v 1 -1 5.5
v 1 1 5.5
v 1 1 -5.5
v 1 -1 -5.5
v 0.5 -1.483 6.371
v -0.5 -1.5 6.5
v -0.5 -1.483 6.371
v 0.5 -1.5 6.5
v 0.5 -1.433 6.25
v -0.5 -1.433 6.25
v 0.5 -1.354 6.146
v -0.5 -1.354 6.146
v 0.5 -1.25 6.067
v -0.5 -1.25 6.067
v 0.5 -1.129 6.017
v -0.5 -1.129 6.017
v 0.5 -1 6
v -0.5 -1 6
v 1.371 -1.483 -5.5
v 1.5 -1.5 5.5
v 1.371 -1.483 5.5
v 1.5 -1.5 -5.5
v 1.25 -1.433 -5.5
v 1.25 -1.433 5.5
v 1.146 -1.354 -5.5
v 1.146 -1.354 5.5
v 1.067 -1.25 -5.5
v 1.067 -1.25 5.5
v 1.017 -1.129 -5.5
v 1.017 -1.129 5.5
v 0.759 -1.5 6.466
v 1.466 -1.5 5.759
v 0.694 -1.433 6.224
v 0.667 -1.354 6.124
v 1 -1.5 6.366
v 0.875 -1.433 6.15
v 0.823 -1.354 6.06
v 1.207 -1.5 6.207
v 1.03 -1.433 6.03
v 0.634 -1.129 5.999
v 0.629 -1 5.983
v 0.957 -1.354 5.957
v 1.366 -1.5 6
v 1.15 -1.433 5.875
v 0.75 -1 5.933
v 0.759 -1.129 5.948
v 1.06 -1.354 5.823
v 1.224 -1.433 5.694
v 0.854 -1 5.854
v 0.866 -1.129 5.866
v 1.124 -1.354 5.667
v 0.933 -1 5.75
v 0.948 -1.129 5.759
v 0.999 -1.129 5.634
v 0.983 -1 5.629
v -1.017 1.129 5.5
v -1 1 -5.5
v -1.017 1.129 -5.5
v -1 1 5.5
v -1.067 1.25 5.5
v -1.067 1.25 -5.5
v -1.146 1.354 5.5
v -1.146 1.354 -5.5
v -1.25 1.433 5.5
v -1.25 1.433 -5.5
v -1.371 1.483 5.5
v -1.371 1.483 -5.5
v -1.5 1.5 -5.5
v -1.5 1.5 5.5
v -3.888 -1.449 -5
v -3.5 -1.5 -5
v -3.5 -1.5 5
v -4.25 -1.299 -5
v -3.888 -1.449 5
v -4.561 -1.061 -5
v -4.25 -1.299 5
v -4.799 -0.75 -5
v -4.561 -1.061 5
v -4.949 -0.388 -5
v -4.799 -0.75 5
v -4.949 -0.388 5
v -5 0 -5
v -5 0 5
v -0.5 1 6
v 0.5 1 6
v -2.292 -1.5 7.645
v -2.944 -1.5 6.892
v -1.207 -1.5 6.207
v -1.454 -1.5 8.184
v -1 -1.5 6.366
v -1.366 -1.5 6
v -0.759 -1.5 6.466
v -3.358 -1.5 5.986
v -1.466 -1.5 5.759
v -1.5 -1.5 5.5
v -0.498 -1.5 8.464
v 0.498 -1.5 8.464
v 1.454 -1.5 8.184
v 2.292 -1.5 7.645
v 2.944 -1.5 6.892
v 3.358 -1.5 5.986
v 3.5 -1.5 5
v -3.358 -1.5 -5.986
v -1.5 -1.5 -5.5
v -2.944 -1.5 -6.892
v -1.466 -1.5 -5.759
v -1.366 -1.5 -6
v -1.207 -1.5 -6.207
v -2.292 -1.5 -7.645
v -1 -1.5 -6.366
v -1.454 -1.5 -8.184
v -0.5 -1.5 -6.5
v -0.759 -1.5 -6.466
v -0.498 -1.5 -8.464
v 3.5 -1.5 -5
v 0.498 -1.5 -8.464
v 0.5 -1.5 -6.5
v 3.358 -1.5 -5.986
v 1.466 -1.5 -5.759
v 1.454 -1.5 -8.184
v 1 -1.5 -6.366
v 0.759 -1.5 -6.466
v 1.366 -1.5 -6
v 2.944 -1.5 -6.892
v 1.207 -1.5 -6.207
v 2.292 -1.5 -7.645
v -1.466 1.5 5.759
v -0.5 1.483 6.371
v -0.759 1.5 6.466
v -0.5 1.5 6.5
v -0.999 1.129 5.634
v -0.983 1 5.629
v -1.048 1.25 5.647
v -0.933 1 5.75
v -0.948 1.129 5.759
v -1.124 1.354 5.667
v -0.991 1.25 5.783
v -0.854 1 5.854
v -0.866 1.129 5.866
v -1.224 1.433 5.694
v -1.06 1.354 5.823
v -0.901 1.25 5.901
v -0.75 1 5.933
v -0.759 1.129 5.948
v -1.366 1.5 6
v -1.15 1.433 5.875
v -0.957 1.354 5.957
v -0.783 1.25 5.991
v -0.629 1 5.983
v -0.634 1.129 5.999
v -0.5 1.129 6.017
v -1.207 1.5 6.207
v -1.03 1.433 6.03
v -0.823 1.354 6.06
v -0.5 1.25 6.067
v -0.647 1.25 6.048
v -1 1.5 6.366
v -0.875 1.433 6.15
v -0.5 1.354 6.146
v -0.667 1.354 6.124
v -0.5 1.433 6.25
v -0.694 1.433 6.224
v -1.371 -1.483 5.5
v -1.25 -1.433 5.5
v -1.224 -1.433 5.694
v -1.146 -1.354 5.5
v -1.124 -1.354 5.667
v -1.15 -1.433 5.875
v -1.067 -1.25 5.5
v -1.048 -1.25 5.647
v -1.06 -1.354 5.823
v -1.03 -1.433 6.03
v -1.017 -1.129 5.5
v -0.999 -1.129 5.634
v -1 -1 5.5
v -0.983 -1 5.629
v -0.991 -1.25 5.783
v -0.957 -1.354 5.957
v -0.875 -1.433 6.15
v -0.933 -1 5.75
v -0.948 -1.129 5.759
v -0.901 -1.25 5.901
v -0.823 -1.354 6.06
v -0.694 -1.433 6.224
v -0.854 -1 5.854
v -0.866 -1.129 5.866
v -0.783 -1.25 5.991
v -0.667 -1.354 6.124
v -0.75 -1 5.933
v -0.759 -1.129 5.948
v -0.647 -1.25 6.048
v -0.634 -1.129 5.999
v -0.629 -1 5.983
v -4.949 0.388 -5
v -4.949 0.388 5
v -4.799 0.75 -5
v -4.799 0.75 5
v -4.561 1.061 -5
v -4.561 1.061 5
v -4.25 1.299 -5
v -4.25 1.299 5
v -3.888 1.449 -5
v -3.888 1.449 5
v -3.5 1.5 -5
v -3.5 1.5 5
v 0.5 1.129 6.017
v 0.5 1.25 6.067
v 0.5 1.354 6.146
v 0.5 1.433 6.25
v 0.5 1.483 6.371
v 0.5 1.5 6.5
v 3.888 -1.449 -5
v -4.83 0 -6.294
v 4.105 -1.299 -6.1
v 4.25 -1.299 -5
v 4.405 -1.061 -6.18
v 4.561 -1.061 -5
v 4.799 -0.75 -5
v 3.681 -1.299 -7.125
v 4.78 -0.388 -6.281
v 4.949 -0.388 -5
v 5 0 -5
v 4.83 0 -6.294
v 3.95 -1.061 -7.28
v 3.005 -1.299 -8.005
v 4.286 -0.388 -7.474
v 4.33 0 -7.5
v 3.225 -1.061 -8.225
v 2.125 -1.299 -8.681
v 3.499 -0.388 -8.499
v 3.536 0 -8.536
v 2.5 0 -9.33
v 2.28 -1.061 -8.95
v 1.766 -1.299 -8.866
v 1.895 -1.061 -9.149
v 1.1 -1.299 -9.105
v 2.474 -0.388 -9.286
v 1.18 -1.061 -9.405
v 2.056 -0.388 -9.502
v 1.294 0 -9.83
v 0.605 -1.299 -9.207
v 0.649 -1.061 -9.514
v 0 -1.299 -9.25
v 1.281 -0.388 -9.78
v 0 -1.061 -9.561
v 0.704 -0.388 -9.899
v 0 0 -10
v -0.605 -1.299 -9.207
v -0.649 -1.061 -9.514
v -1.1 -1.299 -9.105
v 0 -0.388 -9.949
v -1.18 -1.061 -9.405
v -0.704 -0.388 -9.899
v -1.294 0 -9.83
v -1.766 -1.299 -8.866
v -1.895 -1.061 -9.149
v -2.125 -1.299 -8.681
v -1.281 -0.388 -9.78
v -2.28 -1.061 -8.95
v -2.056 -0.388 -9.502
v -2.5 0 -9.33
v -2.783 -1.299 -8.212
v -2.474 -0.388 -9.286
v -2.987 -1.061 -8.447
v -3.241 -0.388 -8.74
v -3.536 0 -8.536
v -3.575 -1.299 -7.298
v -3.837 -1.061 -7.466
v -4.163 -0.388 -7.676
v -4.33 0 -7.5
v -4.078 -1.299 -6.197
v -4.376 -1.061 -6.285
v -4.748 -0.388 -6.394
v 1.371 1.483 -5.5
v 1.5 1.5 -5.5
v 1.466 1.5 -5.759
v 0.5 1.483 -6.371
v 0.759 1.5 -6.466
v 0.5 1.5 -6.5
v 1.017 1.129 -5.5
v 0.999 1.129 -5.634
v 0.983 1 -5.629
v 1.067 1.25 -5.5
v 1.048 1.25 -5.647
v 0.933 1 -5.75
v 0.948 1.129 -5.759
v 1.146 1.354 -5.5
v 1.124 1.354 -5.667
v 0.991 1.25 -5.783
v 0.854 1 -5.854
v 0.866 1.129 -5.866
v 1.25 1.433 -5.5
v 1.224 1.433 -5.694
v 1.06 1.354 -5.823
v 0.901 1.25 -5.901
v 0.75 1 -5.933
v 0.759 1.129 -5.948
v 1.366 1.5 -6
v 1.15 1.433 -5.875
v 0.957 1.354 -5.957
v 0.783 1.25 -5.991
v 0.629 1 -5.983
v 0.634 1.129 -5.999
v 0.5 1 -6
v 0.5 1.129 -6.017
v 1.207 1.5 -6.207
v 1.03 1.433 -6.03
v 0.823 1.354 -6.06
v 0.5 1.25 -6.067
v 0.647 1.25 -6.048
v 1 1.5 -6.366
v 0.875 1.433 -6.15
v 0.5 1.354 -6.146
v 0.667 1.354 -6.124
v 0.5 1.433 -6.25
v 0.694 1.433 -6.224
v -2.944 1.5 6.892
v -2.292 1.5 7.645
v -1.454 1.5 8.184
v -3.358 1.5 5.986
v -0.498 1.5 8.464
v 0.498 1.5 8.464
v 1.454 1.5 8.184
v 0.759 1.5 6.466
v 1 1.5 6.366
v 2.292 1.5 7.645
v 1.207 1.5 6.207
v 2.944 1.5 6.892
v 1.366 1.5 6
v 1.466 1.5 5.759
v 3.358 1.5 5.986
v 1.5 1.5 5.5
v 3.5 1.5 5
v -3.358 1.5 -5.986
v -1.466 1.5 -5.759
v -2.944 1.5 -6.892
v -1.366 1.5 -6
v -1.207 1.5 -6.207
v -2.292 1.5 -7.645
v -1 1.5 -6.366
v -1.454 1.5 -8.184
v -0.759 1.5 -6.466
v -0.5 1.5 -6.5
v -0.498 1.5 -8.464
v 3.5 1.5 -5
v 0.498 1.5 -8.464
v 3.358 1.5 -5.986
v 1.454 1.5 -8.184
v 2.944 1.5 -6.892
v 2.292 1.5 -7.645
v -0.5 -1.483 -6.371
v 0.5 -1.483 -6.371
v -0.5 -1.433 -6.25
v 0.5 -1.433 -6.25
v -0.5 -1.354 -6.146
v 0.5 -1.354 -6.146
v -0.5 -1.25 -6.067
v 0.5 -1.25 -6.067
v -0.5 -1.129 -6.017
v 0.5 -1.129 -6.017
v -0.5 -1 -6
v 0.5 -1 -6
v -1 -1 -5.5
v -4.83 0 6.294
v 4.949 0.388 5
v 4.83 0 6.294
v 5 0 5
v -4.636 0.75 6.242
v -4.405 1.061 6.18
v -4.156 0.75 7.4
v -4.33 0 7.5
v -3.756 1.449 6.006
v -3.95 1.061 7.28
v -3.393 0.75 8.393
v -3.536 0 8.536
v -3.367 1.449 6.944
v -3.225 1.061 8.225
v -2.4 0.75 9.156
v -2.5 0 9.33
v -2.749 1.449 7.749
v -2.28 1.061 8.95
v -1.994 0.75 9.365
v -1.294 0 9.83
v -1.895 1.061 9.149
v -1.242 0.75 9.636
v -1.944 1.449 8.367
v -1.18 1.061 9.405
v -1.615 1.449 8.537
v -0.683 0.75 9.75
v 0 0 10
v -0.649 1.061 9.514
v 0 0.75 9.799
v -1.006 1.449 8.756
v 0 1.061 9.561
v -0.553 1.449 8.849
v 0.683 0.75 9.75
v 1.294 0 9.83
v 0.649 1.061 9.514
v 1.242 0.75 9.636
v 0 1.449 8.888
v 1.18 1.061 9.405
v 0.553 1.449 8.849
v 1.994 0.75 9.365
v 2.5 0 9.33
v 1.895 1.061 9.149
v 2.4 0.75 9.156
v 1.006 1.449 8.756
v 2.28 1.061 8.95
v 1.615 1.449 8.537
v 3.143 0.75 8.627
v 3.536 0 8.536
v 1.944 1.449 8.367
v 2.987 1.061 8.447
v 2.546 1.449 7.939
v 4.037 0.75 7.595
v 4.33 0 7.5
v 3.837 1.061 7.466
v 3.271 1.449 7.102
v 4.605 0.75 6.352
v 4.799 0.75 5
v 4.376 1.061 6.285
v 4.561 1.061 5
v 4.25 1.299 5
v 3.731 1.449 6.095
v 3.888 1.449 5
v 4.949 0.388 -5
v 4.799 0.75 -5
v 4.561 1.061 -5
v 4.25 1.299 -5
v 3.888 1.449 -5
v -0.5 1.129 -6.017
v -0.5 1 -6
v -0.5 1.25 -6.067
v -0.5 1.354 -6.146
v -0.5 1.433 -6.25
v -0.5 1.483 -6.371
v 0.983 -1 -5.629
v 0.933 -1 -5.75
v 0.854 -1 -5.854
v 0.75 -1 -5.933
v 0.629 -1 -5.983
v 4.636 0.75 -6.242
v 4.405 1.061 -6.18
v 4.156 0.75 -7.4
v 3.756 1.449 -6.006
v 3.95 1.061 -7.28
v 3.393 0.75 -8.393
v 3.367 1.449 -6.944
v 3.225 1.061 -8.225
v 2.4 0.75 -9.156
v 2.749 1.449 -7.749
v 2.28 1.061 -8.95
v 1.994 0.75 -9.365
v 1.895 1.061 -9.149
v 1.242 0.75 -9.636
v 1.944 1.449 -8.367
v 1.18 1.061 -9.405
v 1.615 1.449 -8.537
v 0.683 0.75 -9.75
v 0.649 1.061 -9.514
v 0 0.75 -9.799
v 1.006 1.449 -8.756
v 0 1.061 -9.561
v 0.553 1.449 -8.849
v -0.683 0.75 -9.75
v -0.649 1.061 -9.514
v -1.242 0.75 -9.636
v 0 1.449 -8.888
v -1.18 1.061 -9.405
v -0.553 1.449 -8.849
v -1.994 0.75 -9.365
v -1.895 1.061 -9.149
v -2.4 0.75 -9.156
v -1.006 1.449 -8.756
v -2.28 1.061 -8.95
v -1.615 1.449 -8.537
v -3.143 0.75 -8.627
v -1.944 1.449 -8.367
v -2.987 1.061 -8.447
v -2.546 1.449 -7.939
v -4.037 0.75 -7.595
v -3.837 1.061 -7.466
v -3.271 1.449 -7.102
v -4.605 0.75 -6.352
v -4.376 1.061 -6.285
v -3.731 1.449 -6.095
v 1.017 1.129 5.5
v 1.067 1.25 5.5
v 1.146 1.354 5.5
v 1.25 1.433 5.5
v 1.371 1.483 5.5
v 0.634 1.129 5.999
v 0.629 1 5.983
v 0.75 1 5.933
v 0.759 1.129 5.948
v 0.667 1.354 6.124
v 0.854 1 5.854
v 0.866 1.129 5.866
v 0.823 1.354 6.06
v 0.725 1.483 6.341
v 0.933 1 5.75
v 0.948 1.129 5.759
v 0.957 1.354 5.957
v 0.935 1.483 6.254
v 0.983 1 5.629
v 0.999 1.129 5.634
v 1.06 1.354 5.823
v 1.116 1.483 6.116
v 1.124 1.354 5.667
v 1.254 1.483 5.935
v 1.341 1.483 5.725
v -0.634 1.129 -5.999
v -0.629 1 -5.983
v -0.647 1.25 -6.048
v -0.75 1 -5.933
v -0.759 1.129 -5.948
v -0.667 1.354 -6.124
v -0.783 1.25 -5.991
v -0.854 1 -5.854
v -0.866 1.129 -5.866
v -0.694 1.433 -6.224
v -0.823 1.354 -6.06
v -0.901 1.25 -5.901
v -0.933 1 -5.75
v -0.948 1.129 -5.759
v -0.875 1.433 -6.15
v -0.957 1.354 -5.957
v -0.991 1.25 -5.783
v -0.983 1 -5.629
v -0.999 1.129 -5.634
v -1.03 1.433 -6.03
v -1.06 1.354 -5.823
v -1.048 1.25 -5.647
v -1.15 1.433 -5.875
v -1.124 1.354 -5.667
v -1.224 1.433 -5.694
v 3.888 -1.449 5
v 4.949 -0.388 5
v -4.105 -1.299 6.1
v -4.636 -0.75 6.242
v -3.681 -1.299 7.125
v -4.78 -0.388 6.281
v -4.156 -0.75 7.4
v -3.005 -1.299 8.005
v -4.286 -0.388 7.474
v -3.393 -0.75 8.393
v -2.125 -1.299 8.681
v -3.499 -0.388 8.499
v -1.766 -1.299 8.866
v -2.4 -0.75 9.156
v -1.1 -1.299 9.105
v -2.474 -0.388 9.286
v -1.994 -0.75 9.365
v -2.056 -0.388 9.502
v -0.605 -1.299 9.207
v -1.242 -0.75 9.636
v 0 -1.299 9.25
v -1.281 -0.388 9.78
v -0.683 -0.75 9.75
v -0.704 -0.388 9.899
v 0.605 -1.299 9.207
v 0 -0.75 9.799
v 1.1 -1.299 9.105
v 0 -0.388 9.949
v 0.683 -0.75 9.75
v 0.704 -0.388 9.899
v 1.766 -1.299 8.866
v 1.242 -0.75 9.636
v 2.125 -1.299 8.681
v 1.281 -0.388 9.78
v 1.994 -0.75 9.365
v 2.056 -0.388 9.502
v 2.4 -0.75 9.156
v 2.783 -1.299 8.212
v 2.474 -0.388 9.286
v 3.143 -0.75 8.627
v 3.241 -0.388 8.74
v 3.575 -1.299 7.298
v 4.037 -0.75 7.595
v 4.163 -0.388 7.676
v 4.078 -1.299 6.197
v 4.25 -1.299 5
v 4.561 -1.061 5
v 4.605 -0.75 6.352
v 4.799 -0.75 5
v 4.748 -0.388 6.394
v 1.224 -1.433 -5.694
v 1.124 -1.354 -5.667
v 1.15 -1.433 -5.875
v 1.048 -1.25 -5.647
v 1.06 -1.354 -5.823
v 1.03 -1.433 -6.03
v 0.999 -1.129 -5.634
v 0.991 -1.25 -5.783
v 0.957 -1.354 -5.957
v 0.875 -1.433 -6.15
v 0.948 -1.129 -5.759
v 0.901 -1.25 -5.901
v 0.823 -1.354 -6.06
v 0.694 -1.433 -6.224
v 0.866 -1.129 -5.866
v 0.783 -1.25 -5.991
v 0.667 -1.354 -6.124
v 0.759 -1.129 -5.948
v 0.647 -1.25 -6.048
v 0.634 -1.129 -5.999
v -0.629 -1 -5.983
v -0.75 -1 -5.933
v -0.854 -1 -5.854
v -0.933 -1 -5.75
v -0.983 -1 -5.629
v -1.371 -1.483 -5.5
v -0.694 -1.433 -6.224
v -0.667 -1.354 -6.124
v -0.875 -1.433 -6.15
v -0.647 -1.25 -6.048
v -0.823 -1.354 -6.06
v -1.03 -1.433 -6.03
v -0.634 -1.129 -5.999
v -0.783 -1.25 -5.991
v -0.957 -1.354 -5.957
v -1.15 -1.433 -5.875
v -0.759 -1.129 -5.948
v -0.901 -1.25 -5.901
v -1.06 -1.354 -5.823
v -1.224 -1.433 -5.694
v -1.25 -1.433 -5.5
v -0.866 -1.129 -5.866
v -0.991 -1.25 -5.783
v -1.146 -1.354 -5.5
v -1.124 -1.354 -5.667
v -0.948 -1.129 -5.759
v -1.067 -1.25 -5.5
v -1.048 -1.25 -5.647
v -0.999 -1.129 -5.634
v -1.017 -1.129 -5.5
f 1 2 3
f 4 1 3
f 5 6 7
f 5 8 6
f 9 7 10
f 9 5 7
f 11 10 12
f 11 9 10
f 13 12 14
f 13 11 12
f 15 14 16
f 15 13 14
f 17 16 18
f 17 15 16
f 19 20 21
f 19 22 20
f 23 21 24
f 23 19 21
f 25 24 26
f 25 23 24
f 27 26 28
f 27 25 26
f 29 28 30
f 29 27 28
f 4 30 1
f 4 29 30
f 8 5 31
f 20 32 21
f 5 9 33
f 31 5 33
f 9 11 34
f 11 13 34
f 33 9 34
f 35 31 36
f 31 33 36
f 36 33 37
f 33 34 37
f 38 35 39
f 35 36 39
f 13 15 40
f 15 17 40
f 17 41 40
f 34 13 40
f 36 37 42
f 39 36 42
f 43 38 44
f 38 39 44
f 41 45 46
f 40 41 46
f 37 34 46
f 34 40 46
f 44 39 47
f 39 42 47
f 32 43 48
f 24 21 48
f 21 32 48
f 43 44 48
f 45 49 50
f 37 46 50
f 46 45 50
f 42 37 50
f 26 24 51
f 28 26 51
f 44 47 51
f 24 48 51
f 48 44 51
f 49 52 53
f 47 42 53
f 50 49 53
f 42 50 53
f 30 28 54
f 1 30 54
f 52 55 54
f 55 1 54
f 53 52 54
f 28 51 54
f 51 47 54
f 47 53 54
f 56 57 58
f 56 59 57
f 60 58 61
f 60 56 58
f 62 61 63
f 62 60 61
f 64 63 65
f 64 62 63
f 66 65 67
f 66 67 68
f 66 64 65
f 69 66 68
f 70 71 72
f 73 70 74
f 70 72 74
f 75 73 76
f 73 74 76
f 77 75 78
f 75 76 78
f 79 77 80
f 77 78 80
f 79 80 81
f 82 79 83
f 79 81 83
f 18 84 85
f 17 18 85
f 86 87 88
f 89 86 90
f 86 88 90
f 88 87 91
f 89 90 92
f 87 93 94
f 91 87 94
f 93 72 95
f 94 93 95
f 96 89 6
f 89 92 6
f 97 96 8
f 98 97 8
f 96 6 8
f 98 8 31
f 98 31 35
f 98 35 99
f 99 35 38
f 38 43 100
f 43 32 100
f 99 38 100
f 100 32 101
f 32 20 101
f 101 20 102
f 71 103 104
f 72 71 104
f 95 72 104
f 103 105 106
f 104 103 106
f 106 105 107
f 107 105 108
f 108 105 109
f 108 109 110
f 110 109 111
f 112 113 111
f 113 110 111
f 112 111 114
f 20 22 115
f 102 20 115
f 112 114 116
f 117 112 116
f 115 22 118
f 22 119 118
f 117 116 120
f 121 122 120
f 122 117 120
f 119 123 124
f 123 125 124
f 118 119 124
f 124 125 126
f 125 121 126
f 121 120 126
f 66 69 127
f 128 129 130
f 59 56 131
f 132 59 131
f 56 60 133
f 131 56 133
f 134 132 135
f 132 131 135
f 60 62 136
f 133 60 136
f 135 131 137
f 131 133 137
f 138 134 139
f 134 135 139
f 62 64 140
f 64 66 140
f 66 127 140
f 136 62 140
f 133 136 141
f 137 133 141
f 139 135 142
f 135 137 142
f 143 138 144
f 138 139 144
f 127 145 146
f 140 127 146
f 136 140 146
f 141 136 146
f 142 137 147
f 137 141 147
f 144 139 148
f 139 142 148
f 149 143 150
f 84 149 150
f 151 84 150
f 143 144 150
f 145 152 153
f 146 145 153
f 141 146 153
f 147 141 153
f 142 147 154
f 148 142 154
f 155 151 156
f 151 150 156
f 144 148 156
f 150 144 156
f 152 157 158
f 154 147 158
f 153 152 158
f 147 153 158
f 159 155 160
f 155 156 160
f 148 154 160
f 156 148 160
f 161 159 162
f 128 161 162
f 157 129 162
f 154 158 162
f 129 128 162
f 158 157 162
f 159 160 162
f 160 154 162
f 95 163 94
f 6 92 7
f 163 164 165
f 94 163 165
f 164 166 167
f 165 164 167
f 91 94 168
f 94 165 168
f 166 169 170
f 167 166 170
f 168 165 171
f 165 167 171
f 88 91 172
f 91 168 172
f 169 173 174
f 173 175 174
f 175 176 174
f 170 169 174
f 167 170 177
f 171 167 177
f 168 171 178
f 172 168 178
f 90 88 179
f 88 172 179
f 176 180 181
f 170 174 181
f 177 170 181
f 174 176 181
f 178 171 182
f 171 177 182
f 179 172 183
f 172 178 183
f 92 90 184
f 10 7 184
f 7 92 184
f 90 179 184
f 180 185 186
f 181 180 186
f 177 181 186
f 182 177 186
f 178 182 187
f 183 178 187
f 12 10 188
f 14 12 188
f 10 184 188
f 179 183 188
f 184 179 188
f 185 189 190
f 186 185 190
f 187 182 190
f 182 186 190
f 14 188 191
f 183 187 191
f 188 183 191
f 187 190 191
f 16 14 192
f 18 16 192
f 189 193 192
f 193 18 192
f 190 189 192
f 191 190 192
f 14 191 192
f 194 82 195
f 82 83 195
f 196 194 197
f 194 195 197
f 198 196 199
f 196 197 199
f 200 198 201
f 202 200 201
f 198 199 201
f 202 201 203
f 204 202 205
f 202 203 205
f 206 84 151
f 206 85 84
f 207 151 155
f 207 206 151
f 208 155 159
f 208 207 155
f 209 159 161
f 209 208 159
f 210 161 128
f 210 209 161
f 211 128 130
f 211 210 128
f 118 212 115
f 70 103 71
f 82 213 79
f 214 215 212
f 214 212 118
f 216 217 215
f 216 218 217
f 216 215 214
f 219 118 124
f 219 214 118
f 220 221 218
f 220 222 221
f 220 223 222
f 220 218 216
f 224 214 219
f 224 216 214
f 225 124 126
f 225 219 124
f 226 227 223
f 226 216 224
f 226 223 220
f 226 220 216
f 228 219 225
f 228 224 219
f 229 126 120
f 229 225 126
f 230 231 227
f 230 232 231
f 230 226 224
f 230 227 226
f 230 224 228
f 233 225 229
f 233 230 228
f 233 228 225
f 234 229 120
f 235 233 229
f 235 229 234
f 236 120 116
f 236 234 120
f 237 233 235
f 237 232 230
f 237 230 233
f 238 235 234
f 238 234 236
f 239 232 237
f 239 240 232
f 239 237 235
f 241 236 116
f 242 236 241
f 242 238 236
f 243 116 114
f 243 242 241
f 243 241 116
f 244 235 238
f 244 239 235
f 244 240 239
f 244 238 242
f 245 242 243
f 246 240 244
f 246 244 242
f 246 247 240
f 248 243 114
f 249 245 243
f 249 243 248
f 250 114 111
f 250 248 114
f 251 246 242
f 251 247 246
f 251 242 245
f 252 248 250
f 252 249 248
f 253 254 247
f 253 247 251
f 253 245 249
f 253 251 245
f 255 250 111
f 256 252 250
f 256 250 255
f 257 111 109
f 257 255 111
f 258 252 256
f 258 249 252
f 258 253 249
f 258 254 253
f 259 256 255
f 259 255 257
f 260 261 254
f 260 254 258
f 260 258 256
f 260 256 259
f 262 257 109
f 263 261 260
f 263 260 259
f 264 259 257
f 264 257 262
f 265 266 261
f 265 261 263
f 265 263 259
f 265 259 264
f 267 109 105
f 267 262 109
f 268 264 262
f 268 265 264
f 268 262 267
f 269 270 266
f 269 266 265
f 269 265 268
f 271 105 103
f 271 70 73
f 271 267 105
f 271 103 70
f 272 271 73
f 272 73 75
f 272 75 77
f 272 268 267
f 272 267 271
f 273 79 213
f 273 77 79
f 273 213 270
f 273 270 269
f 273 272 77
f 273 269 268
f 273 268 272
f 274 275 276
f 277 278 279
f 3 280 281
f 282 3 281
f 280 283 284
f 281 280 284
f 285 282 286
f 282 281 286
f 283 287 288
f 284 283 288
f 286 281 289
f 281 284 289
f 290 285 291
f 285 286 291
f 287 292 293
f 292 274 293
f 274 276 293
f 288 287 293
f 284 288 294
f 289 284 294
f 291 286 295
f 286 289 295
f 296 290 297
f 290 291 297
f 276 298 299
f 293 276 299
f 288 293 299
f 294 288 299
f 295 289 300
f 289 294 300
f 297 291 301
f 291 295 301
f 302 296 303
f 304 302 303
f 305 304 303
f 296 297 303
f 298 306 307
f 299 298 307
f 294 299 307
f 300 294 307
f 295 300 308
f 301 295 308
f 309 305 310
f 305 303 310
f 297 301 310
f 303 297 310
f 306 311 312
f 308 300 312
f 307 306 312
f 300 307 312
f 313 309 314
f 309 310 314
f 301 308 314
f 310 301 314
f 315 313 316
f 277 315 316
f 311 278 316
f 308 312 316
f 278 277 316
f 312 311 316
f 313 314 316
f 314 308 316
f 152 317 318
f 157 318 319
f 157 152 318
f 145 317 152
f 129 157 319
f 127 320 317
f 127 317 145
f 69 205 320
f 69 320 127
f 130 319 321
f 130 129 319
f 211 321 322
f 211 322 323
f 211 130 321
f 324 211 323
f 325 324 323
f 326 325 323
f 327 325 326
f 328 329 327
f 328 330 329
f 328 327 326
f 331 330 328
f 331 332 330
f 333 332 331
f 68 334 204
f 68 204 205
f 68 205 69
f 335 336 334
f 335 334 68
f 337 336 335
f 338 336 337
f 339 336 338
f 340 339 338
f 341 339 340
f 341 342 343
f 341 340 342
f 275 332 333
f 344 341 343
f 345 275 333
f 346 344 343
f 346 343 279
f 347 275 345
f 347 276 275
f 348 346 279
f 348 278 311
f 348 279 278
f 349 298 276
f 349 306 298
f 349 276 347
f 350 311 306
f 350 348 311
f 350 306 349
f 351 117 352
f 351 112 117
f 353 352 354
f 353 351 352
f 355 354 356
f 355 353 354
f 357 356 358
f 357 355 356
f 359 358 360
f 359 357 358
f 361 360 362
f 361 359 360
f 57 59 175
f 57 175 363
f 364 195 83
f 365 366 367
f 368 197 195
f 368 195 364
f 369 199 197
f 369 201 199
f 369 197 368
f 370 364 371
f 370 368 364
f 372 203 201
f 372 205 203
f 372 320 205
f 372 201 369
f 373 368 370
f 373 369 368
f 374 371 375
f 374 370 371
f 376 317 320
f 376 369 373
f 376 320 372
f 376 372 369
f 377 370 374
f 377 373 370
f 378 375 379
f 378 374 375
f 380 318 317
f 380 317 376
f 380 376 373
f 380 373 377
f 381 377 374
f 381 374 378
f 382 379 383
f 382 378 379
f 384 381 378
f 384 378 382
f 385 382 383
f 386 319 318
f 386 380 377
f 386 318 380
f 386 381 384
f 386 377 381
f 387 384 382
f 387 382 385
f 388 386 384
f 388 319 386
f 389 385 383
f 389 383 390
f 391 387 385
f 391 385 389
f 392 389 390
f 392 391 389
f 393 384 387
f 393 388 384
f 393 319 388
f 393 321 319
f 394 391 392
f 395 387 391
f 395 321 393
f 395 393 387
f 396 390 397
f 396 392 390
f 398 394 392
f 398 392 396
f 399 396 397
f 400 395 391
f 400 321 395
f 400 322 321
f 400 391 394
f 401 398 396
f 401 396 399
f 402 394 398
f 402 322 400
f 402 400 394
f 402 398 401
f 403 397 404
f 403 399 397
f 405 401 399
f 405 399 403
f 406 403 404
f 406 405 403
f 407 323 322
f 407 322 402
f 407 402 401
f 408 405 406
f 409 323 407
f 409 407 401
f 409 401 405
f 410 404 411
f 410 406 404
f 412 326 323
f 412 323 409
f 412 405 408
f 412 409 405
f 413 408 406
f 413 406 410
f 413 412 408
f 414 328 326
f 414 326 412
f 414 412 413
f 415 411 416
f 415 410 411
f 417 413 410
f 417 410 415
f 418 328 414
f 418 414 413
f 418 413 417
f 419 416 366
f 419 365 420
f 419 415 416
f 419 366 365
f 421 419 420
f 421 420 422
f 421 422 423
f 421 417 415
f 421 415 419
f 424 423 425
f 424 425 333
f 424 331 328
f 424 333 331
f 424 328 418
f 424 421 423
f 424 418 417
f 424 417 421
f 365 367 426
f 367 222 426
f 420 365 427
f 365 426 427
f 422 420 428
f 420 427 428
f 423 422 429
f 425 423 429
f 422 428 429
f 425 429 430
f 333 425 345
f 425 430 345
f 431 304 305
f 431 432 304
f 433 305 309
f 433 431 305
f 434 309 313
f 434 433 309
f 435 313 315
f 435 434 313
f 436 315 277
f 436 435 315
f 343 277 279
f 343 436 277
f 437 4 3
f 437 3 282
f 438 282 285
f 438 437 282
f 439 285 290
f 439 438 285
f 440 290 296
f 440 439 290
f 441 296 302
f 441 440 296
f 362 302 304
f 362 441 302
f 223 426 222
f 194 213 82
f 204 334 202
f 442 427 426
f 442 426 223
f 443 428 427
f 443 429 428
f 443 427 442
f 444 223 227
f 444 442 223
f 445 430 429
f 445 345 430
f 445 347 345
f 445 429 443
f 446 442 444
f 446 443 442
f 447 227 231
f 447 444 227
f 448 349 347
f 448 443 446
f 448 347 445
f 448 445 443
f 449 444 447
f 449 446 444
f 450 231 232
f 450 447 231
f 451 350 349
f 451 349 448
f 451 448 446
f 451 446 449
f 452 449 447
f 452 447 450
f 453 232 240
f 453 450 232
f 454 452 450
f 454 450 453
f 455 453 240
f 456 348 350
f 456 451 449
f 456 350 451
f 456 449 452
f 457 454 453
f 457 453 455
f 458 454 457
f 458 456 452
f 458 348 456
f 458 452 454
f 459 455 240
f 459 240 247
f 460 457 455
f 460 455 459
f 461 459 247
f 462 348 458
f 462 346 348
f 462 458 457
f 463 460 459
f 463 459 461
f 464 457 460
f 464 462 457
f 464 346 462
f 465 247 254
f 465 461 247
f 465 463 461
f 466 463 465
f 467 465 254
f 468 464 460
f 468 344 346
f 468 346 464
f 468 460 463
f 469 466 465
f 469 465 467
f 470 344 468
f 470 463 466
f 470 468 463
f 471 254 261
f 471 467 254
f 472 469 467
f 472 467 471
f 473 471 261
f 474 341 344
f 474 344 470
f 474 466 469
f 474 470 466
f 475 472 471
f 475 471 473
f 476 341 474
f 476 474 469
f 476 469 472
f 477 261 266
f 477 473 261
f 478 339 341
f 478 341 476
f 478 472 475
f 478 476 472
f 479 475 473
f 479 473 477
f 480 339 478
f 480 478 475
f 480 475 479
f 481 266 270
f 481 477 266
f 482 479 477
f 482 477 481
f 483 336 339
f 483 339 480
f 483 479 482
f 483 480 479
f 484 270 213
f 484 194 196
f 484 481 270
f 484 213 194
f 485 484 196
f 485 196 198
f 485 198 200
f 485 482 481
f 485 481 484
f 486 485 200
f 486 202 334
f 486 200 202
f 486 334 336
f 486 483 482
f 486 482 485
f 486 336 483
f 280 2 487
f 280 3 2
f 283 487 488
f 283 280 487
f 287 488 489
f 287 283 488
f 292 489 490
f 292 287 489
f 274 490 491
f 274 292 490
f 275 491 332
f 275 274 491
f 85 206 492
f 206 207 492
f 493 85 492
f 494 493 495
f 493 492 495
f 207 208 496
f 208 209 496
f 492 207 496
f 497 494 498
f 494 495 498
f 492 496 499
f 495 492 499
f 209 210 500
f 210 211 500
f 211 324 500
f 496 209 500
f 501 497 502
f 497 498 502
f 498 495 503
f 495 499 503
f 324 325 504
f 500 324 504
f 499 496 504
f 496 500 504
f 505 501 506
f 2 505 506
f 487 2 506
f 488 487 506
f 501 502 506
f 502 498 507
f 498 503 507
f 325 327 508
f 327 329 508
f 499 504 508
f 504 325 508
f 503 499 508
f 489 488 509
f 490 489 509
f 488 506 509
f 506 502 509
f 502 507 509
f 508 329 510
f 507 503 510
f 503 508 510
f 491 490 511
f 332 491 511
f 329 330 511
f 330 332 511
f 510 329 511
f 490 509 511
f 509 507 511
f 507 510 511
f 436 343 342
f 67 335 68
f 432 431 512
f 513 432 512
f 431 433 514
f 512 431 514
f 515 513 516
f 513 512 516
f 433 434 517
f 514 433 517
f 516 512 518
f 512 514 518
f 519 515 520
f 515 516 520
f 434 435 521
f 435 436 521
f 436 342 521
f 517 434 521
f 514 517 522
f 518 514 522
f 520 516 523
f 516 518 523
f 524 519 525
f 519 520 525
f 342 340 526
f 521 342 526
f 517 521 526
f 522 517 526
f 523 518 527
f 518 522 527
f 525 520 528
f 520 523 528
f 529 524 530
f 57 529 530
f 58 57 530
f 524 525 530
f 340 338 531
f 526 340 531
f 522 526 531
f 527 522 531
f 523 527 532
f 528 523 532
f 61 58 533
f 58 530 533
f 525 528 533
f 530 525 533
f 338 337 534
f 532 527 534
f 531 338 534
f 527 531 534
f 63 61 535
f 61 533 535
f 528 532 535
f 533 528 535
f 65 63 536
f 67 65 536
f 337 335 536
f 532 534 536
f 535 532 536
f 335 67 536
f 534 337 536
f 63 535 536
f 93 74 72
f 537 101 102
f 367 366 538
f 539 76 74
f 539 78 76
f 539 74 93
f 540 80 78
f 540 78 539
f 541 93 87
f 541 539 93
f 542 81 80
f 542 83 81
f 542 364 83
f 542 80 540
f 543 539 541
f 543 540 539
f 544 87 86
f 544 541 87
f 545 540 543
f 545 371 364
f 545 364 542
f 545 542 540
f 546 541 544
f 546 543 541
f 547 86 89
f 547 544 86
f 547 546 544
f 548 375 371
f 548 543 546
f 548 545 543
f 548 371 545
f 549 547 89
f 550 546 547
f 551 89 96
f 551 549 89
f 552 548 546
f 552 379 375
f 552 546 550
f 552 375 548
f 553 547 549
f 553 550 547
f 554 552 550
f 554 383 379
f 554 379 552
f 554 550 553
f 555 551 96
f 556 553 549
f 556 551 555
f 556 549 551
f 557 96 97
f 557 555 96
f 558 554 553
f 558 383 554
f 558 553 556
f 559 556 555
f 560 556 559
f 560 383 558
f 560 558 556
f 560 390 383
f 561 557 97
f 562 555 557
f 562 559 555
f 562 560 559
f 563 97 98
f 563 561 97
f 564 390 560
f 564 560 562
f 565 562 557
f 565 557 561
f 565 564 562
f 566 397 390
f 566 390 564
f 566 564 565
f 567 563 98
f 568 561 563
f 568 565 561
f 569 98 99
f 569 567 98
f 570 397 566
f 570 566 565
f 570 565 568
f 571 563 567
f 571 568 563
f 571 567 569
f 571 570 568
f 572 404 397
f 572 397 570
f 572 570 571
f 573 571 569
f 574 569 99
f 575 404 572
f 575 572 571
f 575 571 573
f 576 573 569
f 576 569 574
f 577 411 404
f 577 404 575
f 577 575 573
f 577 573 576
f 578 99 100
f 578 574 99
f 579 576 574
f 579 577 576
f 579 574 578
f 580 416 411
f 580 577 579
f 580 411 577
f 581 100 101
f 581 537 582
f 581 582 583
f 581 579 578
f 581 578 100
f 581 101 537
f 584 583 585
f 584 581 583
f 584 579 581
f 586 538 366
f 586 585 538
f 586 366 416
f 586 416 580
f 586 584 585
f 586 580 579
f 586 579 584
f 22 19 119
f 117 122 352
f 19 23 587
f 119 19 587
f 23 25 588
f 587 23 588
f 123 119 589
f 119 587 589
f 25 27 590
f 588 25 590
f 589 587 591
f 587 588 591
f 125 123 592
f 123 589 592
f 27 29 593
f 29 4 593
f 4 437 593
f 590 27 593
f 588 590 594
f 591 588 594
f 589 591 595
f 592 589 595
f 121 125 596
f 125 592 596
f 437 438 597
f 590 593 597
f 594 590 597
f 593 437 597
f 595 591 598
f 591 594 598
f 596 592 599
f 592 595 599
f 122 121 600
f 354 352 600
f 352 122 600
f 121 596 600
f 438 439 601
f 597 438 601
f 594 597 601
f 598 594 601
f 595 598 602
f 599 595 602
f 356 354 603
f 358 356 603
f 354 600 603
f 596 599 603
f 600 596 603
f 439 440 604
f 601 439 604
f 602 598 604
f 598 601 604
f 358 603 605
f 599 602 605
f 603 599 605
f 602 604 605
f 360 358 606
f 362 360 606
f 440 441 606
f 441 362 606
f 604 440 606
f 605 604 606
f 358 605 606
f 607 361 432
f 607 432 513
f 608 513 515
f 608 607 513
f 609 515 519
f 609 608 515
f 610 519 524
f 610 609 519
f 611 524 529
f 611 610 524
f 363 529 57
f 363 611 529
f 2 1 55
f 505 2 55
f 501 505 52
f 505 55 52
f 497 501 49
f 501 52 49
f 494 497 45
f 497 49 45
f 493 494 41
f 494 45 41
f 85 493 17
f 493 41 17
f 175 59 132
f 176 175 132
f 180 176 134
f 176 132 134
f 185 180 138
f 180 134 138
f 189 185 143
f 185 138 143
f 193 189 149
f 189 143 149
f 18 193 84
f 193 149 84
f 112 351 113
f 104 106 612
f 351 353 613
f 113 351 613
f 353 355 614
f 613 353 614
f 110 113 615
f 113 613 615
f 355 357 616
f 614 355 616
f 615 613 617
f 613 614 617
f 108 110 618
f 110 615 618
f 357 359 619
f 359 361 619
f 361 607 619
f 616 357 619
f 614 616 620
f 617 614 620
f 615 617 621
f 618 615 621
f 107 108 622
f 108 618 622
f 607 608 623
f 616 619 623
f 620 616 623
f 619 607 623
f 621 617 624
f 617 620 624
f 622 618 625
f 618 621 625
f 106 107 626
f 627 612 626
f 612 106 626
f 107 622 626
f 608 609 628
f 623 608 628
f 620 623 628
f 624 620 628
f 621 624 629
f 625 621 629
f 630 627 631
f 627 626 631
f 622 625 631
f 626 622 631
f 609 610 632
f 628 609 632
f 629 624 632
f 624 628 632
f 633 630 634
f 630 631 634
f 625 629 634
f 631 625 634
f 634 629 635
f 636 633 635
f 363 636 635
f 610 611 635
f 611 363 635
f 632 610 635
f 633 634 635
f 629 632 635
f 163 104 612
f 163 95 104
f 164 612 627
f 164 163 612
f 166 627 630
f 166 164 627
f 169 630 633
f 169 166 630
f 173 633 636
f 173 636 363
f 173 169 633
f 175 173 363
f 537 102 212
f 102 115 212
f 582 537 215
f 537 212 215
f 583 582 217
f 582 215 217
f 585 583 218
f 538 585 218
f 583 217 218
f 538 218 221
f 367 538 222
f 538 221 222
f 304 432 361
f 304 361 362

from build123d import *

# Parameters (mm, degrees)
SKETCH1_W      = 10
SKETCH1_H      = 20
SKETCH1_W_2    = 2
SKETCH1_H_2    = 12
EXTRUDE1_DEPTH = 1.5
FILLET1_RADIUS = 5
FILLET1_LENGTH = 3
FILLET5_RADIUS = 5
FILLET5_LENGTH = 3
FILLET3_R      = 0.5
FILLET4_R      = 0.5
FILLET6_R      = 1.5


with BuildPart() as part:
    # Sketch1 → Extrude1 (new, symmetric)
    with BuildSketch(Plane(origin=(0, 0, 0), x_dir=(1, 0, 0), z_dir=(0, 1, 0))):
        Rectangle(SKETCH1_W, SKETCH1_H)
        Rectangle(SKETCH1_W_2, SKETCH1_H_2, mode=Mode.SUBTRACT)
    extrude(amount=EXTRUDE1_DEPTH, both=True)

    # Fillet1: full round fillet: the end face becomes a half cylinder, R = half its width
    fillet1_face = Plane((0, 0, 10), x_dir=(0, 1, 0), z_dir=(0, 0, 1))  # on the end face: x along it, z out of the body
    fillet1_slab = fillet1_face.offset(-FILLET1_RADIUS / 2) * Box(FILLET1_LENGTH, 2 * FILLET1_RADIUS, FILLET1_RADIUS, mode=Mode.PRIVATE)  # the body's end, R deep
    fillet1_round = Plane((0, 0, 5), x_dir=(0, 0, 1), z_dir=(0, 1, 0)) * Cylinder(FILLET1_RADIUS, FILLET1_LENGTH, mode=Mode.PRIVATE)  # its axis R under the face
    add(fillet1_slab - fillet1_round, mode=Mode.SUBTRACT)

    # Fillet5: full round fillet: the end face becomes a half cylinder, R = half its width
    fillet5_face = Plane((0, 0, -10), x_dir=(0, 1, 0), z_dir=(0, 0, -1))  # on the end face: x along it, z out of the body
    fillet5_slab = fillet5_face.offset(-FILLET5_RADIUS / 2) * Box(FILLET5_LENGTH, 2 * FILLET5_RADIUS, FILLET5_RADIUS, mode=Mode.PRIVATE)  # the body's end, R deep
    fillet5_round = Plane((0, 0, -5), x_dir=(0, 0, -1), z_dir=(0, 1, 0)) * Cylinder(FILLET5_RADIUS, FILLET5_LENGTH, mode=Mode.PRIVATE)  # its axis R under the face
    add(fillet5_slab - fillet5_round, mode=Mode.SUBTRACT)

    # Fillet3
    fillet3_edges = [part.edges().sort_by_distance(p)[0] for p in [
        (-1, 0, -6),
        (-1, 0, 6),
        (1, 0, 6),
        (1, 0, -6),
    ]]
    fillet(fillet3_edges, radius=FILLET3_R)

    # Fillet4
    fillet4_edges = [part.edges().sort_by_distance(p)[0] for p in [
        (1, -1.5, 0),
        (1, 1.5, 0),
        (0, -1.5, -6),
        (0, 1.5, -6),
        (-1, -1.5, 0),
        (-1, 1.5, 0),
        (0, -1.5, 6),
        (0, 1.5, 6),
        (0.853553391, -1.5, -5.853553391),
        (0.853553391, 1.5, -5.853553391),
        (-0.853553391, -1.5, -5.853553391),
        (-0.853553391, 1.5, -5.853553391),
        (0.853553391, -1.5, 5.853553391),
        (0.853553391, 1.5, 5.853553391),
        (-0.853553391, -1.5, 5.853553391),
        (-0.853553391, 1.5, 5.853553391),
    ]]
    fillet(fillet4_edges, radius=FILLET4_R)

    # Fillet6
    fillet6_edges = [part.edges().sort_by_distance(p)[0] for p in [
        (5, -1.5, 0),
        (5, 1.5, 0),
        (0, 1.5, 10),
        (-5, -1.5, 0),
        (-5, 1.5, 0),
        (0, -1.5, -10),
    ]]
    fillet(fillet6_edges, radius=FILLET6_R - 0.0001)  # a hair under: the kernel refuses the full size


solid = part.part
